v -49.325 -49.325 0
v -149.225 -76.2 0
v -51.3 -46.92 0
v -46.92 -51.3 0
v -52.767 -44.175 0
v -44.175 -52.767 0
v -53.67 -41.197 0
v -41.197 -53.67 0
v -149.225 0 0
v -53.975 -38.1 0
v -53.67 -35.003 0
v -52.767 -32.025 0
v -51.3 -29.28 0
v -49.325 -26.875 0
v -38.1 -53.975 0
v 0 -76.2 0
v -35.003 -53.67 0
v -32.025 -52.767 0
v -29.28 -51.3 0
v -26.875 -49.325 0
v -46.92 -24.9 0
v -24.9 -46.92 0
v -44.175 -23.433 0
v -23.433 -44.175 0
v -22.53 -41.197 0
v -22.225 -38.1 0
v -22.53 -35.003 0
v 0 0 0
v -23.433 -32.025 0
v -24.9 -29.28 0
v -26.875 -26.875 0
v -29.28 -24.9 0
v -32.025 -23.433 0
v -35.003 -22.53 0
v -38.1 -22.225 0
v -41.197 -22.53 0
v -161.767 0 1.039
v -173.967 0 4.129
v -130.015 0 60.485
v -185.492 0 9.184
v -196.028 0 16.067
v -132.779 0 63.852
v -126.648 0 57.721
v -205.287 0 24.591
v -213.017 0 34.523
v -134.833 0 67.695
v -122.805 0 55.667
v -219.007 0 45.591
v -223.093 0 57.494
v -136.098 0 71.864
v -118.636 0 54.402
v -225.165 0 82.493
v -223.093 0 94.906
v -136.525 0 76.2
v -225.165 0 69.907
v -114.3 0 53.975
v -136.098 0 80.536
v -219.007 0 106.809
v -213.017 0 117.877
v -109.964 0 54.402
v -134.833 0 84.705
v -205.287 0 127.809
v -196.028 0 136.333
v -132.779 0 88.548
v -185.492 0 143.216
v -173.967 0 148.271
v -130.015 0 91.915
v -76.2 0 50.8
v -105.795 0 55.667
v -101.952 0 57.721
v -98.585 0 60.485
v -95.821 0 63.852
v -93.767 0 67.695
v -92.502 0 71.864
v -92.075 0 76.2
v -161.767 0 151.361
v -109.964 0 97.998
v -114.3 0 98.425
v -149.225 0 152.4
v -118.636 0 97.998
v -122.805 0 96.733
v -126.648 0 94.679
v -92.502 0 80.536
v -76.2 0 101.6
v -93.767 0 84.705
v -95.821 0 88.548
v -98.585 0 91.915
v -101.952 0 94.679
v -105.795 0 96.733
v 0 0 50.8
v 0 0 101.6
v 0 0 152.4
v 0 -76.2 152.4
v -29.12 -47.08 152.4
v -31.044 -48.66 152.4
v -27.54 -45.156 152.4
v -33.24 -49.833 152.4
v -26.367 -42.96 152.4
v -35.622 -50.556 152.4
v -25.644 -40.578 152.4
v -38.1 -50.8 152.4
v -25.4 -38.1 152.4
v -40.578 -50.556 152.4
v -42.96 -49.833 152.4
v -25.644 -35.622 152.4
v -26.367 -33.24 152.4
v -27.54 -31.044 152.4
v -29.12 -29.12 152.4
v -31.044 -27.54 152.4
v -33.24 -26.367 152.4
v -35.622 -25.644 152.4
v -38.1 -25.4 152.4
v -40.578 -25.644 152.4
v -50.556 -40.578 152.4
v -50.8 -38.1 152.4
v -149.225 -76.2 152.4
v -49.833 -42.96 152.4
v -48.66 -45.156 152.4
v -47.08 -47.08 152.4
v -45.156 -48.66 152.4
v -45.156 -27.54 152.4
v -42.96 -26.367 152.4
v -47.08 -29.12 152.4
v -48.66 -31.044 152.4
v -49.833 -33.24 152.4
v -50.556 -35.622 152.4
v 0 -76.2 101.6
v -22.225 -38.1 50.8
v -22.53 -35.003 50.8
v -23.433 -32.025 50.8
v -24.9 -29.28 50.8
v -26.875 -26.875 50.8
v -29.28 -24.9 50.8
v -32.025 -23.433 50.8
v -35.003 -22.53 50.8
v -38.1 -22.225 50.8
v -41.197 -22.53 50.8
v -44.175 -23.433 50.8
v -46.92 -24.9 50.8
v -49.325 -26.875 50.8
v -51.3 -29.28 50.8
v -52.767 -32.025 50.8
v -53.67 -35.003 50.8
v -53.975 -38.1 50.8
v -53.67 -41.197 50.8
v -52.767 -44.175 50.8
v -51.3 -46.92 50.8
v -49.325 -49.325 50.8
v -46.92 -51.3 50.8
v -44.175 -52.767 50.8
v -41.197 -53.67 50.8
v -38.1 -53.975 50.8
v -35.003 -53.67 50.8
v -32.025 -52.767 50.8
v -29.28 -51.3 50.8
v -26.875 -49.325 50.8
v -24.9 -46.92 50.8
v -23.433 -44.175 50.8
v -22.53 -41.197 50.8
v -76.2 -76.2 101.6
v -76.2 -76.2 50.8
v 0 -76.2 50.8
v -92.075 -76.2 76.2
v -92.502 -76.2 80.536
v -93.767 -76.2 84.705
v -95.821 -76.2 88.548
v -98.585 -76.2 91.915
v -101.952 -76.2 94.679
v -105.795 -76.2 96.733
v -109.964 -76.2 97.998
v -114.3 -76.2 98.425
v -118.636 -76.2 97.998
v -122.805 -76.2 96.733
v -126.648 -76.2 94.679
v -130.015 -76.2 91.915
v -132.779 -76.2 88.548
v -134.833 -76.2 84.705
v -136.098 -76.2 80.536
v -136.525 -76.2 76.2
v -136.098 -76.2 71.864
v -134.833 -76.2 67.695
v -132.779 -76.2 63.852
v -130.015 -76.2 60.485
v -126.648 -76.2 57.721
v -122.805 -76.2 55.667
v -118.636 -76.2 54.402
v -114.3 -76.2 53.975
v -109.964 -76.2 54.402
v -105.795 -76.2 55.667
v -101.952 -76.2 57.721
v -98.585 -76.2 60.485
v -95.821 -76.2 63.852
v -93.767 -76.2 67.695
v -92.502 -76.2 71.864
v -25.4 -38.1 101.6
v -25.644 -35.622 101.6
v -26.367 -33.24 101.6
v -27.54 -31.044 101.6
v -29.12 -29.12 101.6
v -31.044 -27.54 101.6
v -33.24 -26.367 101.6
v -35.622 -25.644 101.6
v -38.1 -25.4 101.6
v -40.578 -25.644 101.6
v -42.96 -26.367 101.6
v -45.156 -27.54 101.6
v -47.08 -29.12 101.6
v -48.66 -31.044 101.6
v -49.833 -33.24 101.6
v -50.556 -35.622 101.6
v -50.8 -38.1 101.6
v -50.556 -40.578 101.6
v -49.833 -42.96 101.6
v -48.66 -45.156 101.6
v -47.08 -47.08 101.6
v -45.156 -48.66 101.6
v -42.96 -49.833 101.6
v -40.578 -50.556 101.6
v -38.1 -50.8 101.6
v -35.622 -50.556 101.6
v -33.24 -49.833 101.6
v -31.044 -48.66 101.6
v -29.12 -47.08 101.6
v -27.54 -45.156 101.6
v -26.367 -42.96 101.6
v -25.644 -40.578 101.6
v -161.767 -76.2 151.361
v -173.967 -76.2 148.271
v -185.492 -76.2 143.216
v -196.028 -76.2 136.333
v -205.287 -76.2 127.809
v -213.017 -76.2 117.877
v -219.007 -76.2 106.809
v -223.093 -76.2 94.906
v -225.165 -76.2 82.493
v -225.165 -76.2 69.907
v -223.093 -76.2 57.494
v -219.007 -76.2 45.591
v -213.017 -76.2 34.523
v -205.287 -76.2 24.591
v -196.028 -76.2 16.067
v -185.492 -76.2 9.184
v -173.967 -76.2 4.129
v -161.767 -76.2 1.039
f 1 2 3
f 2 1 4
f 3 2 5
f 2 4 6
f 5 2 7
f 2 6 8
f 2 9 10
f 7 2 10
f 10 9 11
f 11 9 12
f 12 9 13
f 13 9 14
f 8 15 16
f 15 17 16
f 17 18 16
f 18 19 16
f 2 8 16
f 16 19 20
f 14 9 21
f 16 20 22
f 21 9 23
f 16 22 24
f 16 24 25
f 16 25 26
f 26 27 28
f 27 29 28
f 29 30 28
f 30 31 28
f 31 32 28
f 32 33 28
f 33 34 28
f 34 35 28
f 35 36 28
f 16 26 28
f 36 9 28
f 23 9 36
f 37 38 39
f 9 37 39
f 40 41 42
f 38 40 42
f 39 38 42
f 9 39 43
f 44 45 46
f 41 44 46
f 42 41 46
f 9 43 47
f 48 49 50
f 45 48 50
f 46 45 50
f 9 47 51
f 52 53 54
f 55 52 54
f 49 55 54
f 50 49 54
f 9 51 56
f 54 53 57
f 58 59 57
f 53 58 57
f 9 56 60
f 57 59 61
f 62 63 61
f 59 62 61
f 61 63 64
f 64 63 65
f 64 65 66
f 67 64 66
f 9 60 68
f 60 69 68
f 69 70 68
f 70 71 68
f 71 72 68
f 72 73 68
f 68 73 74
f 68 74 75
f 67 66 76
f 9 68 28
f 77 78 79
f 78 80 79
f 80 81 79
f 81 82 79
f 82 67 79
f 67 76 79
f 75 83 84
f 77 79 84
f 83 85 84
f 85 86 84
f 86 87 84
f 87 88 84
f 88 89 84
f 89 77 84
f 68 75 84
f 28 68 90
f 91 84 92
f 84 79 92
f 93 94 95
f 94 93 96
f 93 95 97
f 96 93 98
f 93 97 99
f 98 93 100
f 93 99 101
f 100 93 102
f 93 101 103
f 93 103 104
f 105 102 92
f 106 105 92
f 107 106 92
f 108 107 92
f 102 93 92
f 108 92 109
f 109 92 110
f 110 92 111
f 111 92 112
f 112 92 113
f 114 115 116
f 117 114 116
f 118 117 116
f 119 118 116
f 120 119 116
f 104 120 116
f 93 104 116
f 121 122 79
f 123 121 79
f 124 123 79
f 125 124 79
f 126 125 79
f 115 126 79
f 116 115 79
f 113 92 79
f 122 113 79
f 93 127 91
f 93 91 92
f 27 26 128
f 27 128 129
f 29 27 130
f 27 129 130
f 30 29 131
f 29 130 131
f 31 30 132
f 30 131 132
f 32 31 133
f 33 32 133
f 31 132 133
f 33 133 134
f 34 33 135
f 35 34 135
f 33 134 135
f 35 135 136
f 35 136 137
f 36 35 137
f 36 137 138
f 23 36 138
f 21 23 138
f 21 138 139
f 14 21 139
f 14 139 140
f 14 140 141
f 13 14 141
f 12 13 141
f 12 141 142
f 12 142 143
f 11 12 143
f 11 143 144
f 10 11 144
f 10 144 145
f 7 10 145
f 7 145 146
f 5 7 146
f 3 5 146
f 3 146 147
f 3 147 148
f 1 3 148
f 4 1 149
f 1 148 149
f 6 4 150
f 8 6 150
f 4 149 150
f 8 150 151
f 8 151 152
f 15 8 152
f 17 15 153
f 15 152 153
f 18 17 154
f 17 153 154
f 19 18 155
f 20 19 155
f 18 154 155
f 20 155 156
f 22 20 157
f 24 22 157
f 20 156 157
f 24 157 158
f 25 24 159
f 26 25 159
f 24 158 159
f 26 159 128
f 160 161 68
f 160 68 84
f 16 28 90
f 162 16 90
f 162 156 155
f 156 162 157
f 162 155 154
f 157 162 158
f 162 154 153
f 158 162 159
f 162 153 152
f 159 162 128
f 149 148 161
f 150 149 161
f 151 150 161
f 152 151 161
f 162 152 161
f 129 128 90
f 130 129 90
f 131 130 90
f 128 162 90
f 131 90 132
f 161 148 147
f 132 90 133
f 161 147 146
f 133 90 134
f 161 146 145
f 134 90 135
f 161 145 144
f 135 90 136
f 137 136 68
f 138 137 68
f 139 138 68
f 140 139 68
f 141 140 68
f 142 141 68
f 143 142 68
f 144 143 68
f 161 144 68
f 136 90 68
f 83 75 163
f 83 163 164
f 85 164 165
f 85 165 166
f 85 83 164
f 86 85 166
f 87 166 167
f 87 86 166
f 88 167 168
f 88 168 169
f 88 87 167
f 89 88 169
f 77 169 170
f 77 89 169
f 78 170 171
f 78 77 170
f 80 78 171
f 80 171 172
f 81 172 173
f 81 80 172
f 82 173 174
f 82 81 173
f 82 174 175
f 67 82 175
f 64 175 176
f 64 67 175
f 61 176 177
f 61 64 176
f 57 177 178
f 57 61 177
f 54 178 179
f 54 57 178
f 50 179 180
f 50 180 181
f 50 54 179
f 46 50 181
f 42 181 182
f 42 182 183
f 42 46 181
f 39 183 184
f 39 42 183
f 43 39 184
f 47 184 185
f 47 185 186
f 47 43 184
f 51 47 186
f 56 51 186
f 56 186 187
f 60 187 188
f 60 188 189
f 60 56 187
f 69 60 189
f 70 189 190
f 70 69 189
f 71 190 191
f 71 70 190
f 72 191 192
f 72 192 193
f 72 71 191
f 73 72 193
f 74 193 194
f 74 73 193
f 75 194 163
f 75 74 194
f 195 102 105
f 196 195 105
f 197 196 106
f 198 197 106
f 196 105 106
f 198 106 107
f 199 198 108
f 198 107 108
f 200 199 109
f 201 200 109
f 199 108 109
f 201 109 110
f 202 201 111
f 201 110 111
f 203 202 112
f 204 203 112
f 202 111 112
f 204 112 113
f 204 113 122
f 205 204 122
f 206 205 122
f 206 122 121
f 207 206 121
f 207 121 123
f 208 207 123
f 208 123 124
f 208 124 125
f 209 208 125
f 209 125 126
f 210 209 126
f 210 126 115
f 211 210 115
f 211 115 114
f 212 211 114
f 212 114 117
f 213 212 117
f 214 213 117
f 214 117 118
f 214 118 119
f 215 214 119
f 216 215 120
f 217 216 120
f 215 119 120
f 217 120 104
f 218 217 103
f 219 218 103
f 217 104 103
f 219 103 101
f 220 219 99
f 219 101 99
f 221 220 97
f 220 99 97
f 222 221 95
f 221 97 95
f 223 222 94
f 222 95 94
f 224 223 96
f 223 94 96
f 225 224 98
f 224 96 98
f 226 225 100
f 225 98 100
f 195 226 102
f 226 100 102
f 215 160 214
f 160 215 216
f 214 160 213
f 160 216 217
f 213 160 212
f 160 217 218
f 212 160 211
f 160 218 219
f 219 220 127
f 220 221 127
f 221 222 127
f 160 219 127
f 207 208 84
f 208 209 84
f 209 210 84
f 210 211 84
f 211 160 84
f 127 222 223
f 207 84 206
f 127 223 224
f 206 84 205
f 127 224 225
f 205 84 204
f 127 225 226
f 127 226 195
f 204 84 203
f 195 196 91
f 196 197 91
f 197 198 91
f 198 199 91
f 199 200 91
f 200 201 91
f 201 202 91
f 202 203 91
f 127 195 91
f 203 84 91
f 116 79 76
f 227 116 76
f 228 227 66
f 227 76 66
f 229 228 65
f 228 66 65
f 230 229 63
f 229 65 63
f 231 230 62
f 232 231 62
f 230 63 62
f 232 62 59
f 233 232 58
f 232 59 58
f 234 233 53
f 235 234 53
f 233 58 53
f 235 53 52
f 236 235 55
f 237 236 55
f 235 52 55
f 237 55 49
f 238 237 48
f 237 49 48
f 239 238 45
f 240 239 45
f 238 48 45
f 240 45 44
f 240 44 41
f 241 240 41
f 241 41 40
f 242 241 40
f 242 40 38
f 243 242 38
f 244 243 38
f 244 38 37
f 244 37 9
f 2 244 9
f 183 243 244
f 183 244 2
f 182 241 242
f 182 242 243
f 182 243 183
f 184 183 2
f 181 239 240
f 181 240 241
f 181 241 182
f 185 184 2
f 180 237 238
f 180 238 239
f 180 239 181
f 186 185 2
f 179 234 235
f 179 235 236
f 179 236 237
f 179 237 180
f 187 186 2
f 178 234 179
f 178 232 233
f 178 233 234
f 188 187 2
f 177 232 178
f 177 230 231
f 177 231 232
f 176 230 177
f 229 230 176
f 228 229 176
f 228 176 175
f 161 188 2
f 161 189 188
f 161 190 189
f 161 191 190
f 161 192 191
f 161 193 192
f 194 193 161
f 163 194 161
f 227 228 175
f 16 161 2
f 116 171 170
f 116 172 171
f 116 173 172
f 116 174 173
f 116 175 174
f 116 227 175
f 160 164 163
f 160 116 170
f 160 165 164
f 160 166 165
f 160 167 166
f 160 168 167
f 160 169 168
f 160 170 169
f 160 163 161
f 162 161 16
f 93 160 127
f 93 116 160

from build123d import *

# Parameters (mm, degrees)
F0_R     = 22.225
F1_DEPTH = 76.2
F2_R     = 12.7
F4_DEPTH = 56.642
F3_R     = 15.875
F5_DEPTH = 101.6


with BuildPart() as f1:
    # F0 (on Front) → F1 (new body)
    with BuildSketch(Plane.XZ):
        with BuildLine():
            Line((-149.225, 0), (0, 0))
            Line((0, 0), (0, 50.8))
            Line((0, 50.8), (-76.2, 50.8))
            Line((-76.2, 50.8), (-76.2, 101.6))
            Line((-76.2, 101.6), (0, 101.6))
            Line((0, 101.6), (0, 152.4))
            Line((0, 152.4), (-149.225, 152.4))
            ThreePointArc((-149.225, 152.4), (-225.425, 76.2), (-149.225, 0))
        make_face()
        with Locations((-114.3, 76.2)):
            Circle(F0_R, mode=Mode.SUBTRACT)
    extrude(amount=F1_DEPTH)

    # F2 (on face) → F4 (cut)
    with BuildSketch(Plane.XY.offset(152.4)):
        with Locations((-38.1, -38.1)):
            Circle(F2_R)
    extrude(amount=-F4_DEPTH, mode=Mode.SUBTRACT)

    # F3 (on face) → F5 (cut)
    with BuildSketch(Plane.XY.offset(50.8)):
        with Locations((-38.1, -38.1)):
            Circle(F3_R)
    extrude(amount=-F5_DEPTH, mode=Mode.SUBTRACT)


solid = f1.part
